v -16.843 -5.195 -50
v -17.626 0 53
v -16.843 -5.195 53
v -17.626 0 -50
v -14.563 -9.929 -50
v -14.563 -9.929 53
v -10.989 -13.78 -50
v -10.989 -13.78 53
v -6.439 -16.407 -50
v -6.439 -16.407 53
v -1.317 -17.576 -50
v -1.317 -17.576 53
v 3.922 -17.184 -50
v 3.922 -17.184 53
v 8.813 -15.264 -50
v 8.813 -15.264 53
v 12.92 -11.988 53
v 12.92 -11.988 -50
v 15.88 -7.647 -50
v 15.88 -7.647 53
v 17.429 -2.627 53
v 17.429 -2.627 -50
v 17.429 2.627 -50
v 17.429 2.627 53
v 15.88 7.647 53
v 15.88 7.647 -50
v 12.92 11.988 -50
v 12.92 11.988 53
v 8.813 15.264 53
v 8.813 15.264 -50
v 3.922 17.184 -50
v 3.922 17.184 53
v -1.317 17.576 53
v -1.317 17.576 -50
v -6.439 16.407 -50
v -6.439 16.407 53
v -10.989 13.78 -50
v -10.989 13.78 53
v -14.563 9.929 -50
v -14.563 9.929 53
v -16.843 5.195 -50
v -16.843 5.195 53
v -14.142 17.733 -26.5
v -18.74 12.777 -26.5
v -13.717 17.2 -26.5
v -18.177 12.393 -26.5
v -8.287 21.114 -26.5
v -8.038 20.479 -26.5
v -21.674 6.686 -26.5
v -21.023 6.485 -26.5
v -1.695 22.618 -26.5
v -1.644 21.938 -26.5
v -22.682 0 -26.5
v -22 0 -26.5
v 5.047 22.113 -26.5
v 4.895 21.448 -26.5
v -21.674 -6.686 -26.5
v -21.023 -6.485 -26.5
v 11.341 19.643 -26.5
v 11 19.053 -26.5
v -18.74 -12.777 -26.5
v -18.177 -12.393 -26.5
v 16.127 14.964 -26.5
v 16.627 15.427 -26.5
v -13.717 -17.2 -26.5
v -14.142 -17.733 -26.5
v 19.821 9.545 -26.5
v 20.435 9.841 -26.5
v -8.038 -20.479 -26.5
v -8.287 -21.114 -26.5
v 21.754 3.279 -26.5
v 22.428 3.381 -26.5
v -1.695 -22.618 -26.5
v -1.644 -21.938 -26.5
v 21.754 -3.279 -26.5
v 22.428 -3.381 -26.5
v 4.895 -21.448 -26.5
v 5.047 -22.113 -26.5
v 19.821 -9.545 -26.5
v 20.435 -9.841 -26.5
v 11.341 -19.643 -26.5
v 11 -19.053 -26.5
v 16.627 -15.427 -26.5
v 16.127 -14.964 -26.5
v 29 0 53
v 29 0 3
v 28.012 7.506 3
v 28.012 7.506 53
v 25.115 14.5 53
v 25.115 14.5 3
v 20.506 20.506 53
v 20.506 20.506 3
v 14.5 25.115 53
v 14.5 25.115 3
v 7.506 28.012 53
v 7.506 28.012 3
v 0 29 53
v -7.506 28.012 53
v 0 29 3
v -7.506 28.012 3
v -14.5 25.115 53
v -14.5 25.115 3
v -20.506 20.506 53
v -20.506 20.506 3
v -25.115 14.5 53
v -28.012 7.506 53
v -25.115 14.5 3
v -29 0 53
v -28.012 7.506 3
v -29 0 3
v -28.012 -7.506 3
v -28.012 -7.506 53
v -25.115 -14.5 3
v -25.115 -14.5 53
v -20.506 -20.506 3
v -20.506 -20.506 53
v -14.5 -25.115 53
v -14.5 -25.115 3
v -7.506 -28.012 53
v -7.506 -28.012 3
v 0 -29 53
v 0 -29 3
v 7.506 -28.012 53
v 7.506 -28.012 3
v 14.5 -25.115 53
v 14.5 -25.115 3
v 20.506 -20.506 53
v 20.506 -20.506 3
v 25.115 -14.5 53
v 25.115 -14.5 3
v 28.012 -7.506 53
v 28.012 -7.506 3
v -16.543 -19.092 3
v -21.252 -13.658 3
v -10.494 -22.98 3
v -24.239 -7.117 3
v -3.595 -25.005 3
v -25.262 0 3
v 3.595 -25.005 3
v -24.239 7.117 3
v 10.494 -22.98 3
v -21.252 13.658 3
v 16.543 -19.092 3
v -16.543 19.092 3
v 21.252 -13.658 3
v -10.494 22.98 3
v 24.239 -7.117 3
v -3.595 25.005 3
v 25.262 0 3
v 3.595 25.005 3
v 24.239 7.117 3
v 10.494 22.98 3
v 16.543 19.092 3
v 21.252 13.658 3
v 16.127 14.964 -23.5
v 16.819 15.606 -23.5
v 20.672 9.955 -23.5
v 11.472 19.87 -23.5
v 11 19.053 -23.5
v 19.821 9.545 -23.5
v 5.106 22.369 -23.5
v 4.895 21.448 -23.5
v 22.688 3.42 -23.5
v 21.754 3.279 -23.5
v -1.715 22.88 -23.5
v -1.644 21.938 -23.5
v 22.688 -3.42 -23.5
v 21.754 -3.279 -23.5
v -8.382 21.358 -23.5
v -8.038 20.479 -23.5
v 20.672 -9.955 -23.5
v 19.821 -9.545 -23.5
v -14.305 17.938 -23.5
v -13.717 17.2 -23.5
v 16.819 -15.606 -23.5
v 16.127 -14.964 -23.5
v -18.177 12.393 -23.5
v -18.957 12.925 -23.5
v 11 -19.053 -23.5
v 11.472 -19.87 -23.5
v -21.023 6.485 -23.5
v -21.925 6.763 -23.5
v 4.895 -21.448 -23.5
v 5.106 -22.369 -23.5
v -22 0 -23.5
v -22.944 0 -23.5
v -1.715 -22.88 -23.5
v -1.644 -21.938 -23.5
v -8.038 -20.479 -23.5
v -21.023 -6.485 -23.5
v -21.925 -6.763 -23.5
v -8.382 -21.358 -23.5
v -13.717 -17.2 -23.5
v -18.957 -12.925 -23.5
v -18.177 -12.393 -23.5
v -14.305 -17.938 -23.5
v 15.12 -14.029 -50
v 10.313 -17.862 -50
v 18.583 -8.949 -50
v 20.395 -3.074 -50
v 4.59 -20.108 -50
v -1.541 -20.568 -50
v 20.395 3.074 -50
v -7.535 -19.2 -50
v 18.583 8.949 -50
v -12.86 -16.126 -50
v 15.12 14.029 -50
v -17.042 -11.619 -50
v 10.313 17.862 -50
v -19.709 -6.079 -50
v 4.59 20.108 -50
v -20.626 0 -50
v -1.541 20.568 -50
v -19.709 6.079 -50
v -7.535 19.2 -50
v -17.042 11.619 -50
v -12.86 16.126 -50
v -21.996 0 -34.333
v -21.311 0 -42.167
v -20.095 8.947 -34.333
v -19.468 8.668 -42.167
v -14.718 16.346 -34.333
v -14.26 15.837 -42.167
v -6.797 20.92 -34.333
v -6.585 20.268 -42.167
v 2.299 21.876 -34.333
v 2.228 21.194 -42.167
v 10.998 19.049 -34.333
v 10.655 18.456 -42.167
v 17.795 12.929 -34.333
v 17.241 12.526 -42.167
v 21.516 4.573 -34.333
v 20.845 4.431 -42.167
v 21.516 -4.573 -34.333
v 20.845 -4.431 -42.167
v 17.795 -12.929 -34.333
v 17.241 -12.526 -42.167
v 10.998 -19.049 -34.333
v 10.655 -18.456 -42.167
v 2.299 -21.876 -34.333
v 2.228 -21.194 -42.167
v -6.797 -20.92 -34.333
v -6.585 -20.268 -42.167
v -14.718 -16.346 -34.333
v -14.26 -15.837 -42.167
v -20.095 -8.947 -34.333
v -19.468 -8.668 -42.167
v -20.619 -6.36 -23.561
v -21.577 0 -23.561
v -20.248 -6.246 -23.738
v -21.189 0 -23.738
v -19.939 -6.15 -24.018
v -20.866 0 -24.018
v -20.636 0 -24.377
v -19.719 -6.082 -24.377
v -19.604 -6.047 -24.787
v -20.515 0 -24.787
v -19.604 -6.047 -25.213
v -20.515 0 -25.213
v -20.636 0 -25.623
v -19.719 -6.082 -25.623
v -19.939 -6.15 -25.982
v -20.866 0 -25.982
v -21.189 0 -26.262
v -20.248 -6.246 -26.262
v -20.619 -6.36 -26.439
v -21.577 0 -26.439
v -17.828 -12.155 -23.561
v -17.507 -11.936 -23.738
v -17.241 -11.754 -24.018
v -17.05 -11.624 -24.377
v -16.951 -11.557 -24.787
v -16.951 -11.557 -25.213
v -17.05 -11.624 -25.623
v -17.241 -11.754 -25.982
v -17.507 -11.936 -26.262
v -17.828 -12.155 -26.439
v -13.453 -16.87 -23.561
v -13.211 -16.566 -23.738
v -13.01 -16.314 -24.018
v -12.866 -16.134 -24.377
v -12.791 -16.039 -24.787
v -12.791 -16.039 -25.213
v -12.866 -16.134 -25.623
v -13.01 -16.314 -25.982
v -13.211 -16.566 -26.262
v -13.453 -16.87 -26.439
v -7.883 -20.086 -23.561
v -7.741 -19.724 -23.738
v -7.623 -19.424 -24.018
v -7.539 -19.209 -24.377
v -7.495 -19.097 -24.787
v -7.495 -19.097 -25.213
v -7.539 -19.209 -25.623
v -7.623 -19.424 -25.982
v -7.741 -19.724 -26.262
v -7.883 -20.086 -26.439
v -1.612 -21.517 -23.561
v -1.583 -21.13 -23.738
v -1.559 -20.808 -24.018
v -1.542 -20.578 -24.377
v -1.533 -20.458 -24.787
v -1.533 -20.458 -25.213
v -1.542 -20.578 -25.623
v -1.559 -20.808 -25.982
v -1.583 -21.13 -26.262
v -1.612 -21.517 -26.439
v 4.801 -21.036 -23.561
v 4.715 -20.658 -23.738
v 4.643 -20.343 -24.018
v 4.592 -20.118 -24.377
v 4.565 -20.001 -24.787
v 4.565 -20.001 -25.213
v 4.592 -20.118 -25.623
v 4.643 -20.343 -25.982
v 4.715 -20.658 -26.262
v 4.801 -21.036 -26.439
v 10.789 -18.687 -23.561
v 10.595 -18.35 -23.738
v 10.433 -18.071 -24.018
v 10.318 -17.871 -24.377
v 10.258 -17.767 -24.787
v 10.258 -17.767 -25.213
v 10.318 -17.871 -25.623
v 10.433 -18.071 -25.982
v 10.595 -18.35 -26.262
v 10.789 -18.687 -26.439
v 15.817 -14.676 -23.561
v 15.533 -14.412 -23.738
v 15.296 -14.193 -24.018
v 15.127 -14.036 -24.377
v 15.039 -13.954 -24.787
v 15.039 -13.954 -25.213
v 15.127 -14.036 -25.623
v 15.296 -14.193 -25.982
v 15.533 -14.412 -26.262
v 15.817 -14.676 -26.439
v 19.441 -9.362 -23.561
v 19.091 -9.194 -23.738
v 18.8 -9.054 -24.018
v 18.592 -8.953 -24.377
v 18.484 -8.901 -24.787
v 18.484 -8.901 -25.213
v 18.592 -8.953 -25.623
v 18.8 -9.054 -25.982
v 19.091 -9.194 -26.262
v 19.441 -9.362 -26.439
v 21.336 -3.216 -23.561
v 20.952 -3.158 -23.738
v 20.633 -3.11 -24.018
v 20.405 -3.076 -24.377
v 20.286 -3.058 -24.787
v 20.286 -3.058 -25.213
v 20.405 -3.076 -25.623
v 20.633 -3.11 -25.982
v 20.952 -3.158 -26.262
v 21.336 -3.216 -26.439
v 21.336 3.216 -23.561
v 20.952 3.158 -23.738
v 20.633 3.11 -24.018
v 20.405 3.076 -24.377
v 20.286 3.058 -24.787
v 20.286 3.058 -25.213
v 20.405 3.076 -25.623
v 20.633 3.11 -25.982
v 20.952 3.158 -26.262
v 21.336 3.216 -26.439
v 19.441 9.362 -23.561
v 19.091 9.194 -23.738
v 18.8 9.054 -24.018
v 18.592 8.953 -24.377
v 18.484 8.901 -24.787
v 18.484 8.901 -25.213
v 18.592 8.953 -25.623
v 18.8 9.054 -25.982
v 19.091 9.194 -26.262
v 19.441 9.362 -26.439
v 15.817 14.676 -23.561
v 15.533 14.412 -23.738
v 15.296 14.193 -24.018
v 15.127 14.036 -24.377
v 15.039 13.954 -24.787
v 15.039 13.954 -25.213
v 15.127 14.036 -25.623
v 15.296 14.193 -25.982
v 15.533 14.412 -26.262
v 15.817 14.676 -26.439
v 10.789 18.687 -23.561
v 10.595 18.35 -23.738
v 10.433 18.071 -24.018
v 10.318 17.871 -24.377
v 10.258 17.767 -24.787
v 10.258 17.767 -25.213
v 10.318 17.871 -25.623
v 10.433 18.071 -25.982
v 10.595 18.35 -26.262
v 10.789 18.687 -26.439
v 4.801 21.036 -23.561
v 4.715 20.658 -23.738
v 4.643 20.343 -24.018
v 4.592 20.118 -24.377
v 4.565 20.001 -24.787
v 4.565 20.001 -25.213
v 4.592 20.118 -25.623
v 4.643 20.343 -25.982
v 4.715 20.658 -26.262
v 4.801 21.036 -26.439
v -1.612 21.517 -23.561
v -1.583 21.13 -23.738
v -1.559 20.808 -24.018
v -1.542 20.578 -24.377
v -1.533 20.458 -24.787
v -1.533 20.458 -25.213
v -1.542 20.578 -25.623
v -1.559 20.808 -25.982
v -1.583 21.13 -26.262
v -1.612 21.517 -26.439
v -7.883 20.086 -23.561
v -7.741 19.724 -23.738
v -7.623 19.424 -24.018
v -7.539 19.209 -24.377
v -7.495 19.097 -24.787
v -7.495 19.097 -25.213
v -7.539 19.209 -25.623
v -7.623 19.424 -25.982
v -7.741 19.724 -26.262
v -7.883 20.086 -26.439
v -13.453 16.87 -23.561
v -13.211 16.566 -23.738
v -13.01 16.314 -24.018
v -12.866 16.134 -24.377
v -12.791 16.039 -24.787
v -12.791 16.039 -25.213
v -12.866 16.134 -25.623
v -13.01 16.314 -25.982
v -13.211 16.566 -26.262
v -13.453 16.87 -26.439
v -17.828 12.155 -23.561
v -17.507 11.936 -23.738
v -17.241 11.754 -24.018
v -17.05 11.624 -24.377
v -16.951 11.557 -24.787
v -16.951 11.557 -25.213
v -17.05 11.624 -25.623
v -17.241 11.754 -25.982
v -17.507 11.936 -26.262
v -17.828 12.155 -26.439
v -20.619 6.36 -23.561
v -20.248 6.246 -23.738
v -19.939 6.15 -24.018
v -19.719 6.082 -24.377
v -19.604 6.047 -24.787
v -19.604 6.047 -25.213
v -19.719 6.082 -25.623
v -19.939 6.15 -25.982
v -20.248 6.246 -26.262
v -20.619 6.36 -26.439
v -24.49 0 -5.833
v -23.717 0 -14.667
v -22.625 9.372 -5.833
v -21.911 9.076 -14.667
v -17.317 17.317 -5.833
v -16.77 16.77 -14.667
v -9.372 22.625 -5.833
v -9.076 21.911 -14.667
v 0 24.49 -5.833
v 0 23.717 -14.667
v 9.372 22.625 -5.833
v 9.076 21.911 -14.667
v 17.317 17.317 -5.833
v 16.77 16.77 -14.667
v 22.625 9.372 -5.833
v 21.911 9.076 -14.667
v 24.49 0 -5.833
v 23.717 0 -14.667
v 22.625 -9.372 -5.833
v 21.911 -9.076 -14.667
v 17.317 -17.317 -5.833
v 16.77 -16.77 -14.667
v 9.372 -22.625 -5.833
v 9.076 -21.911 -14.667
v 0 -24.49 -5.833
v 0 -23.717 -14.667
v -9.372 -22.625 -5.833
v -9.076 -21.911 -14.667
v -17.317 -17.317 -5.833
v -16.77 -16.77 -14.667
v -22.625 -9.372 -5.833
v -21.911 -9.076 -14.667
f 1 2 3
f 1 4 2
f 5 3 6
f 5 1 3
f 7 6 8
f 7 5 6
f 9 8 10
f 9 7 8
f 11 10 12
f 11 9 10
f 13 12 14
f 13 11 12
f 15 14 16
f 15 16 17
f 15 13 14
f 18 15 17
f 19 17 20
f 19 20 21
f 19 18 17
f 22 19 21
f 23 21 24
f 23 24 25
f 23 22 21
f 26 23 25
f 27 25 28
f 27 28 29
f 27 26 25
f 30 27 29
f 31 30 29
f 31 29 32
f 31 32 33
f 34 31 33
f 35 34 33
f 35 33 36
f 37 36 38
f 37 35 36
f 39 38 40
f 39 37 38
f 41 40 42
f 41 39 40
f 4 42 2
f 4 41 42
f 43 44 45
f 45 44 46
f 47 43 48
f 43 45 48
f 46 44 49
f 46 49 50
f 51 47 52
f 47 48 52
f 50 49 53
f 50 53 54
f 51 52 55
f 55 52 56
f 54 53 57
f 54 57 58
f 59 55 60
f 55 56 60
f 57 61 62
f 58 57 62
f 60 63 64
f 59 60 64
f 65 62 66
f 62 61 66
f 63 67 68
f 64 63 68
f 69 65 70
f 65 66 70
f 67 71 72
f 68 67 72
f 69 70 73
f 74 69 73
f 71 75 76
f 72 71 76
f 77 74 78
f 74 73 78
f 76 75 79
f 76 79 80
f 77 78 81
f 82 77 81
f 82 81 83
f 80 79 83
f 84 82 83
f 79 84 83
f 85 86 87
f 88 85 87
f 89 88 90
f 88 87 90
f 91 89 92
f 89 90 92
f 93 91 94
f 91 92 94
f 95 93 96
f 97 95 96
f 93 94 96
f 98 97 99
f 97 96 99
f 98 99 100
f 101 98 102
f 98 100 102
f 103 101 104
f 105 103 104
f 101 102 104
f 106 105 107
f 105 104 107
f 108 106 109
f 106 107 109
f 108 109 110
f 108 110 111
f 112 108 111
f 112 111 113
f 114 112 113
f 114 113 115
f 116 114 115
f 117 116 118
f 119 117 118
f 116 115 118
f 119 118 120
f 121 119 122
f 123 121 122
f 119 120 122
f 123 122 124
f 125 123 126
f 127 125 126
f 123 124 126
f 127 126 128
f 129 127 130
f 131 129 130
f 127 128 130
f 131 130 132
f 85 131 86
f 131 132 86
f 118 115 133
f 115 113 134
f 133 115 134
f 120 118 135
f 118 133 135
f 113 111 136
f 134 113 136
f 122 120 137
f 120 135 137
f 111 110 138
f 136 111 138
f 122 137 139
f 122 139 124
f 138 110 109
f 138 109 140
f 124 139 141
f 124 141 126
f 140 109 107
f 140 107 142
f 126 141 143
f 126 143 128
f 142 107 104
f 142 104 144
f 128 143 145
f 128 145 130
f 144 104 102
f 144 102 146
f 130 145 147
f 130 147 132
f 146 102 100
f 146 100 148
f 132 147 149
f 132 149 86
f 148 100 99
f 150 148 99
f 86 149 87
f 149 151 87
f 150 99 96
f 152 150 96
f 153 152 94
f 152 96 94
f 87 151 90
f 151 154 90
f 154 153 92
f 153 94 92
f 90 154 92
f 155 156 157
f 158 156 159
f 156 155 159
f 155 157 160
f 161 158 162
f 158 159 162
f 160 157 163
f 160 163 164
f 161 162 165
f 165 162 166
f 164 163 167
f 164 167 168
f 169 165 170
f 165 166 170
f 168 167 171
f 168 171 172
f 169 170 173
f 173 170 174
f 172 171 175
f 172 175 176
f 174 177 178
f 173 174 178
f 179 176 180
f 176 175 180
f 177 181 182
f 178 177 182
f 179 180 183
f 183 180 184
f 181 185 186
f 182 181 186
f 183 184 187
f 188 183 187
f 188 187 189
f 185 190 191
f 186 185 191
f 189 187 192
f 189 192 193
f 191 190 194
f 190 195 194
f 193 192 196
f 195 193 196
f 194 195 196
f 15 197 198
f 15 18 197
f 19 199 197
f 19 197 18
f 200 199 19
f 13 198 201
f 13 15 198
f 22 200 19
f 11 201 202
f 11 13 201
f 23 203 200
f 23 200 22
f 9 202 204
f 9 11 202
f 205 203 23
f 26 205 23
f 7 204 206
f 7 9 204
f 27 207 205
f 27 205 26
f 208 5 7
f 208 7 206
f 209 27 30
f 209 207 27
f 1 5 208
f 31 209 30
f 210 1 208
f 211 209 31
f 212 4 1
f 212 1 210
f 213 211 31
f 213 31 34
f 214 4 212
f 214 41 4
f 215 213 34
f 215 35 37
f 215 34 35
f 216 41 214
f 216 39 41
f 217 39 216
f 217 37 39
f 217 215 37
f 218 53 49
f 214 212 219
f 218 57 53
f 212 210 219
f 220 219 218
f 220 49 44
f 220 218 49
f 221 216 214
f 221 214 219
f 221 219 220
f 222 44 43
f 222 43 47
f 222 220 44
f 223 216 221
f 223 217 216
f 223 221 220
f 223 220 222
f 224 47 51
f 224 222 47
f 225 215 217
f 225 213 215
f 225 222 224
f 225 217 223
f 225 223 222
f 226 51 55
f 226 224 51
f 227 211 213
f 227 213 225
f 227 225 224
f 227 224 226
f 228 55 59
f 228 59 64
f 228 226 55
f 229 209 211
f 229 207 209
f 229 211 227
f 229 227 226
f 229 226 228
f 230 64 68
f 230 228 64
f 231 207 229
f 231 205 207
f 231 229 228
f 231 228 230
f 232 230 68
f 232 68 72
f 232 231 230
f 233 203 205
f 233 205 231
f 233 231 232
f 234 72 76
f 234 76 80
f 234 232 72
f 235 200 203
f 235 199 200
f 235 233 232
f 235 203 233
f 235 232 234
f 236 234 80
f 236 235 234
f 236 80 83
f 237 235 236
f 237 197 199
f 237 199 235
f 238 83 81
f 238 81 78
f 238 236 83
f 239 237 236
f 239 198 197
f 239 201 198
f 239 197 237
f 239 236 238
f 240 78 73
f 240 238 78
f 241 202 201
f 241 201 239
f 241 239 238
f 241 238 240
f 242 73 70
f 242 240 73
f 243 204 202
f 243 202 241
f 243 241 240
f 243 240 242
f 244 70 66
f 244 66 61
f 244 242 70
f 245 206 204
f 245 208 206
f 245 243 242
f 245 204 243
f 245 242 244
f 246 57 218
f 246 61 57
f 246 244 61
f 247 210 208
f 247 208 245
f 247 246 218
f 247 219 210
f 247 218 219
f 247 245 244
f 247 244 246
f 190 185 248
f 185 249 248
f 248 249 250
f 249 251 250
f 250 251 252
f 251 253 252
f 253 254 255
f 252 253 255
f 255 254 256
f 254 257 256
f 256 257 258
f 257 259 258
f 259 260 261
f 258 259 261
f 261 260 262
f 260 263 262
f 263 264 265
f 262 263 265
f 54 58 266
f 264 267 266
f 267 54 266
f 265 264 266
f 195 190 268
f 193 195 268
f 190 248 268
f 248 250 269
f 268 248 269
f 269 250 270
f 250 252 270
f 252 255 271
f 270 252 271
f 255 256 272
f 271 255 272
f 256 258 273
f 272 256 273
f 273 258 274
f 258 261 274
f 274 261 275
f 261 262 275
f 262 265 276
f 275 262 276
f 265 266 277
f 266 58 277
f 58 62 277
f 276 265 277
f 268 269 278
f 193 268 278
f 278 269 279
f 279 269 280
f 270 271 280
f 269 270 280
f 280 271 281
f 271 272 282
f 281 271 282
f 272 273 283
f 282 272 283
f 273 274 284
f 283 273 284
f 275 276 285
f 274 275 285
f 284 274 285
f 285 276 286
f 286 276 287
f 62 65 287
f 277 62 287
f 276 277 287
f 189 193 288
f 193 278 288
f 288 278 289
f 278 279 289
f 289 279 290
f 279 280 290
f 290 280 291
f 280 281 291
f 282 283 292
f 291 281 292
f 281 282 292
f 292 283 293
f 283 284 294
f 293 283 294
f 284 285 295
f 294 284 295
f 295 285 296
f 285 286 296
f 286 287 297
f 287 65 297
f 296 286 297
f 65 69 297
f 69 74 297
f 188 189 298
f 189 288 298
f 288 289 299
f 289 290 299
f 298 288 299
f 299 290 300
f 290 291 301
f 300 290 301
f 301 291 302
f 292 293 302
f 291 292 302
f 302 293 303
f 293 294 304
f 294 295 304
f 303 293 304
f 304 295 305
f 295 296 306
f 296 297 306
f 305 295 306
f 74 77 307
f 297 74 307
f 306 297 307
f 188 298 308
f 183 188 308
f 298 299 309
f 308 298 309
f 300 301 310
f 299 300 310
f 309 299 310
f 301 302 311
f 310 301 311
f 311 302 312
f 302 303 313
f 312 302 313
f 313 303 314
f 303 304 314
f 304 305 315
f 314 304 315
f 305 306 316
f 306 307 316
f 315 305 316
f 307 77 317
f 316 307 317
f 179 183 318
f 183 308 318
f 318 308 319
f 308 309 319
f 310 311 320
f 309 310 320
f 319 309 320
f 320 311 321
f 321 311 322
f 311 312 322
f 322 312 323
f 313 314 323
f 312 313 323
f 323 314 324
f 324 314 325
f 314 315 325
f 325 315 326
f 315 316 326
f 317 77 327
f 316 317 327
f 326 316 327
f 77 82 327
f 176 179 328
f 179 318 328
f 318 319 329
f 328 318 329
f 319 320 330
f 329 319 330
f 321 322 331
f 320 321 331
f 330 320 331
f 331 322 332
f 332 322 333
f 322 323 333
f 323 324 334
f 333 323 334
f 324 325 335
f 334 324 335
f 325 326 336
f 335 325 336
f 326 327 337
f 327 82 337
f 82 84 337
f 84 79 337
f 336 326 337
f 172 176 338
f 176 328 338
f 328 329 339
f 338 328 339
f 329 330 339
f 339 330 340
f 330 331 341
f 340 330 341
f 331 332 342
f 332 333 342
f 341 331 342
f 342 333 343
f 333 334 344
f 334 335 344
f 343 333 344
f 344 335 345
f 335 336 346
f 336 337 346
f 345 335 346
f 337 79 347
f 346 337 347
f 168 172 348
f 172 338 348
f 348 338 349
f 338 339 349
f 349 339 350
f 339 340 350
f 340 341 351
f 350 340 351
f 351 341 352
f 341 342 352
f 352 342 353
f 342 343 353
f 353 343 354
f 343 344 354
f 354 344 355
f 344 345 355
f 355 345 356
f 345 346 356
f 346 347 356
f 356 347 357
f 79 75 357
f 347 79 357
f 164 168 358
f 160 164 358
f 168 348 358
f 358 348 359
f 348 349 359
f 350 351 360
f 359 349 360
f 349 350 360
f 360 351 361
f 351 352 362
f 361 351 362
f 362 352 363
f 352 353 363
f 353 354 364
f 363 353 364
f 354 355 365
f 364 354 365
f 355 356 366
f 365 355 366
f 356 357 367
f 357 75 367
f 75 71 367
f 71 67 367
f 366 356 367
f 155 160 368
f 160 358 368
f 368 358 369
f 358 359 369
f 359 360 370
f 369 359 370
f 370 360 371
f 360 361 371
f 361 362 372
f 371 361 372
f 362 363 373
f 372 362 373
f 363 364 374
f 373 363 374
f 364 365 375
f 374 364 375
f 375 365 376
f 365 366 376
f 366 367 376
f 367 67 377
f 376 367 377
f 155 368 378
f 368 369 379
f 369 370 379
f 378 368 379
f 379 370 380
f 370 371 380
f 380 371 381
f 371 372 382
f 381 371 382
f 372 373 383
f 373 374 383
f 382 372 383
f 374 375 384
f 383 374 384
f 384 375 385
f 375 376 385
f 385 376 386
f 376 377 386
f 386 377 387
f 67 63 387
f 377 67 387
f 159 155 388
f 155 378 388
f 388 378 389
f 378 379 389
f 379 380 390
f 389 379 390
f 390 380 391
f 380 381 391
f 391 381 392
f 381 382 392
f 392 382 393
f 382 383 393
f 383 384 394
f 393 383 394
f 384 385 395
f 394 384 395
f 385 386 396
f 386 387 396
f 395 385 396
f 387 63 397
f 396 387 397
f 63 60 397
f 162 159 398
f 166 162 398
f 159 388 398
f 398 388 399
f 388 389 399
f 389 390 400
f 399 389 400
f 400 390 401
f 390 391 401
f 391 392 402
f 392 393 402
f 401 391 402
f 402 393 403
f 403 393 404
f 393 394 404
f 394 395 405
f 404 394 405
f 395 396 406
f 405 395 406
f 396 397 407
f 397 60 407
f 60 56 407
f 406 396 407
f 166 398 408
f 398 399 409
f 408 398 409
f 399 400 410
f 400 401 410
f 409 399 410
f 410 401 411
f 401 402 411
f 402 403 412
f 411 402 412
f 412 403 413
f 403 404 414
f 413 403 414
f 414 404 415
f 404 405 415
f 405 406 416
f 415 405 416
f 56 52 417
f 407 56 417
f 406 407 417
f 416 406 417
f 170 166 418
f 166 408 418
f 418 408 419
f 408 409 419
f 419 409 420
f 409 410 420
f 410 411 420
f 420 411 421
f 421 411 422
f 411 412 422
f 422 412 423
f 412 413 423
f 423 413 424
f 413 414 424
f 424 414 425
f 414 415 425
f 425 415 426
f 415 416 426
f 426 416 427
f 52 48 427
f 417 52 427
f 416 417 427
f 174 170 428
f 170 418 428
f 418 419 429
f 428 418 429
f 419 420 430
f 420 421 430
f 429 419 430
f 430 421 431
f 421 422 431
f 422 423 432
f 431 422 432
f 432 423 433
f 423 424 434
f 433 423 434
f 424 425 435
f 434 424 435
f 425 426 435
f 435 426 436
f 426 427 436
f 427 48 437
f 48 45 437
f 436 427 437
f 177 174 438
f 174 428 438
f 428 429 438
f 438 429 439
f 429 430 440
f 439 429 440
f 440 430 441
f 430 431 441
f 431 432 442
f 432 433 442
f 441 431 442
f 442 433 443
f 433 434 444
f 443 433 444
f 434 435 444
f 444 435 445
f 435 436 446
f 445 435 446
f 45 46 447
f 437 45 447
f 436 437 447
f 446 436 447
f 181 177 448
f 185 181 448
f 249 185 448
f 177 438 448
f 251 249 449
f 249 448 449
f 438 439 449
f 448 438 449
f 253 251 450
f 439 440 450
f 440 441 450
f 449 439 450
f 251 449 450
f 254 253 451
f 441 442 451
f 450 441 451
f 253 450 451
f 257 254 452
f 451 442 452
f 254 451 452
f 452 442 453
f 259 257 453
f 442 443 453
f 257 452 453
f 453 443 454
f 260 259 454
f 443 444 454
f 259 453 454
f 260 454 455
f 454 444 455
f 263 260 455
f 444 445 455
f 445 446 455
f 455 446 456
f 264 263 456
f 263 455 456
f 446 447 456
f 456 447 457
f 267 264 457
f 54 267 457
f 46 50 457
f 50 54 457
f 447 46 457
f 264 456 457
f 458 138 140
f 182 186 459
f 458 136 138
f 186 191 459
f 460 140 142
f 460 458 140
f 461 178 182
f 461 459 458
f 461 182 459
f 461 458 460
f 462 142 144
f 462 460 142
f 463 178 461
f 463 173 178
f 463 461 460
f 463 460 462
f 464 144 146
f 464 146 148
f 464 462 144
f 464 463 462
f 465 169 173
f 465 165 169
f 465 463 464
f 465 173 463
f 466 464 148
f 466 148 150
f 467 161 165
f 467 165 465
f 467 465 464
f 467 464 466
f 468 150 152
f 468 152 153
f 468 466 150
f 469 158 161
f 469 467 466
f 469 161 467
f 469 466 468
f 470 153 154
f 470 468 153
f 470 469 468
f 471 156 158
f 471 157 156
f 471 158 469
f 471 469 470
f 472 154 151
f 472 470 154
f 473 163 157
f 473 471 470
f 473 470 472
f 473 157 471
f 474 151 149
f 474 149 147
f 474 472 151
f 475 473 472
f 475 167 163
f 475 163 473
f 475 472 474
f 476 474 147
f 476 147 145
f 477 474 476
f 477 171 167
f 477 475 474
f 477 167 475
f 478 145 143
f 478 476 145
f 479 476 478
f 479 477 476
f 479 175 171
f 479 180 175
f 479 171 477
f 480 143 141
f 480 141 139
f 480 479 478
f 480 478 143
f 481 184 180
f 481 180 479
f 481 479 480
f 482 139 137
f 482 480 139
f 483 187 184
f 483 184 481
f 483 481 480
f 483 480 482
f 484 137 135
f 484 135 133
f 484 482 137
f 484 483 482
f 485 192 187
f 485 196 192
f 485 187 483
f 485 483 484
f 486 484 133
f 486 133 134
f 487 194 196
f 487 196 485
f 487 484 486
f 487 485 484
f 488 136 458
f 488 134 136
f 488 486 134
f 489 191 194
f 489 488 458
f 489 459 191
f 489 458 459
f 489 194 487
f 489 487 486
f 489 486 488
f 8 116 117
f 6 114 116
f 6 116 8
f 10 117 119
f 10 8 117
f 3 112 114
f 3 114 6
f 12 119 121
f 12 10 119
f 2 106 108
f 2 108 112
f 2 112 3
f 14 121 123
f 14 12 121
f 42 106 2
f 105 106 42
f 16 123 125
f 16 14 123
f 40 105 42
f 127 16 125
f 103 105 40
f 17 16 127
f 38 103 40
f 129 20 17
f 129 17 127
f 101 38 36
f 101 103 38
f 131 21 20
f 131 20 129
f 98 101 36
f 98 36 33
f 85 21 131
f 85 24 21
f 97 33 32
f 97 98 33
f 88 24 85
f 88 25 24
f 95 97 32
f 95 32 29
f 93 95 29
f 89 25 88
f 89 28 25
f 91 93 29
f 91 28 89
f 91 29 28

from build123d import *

# Parameters (mm, degrees)
SKETCH1_R           = 20.625566824
BOSS_EXTRUDE1_DEPTH = 53
BOSS_EXTRUDE1_DRAFT = 5
SKETCH2_R           = 17.625566824
CUT_EXTRUDE1_DEPTH  = 64.917011631
SKETCH_4_R          = 29
SKETCH_4_R_2        = 17.625566824
EXTRUDE_1_DEPTH     = 50


with BuildPart() as part:
    # Sketch1 → Boss-Extrude1 (with draft: the straight prism first)
    with BuildSketch(Plane(origin=(0, 0, -50), x_dir=(-1, 0, 0), z_dir=(0, 0, -1))):
        Circle(SKETCH1_R)
    extrude(amount=-BOSS_EXTRUDE1_DEPTH)
    # Boss-Extrude1: the draft: its side faces are tilted about the plane it starts from
    boss_extrude1_sides = [part.faces().sort_by_distance(p)[0] for p in [
        (20.625566824, 0, -23.5),
    ]]
    draft(boss_extrude1_sides, Plane(origin=(0, 0, -50), x_dir=(-1, 0, 0), z_dir=(0, 0, -1)), BOSS_EXTRUDE1_DRAFT)

    # Sketch2 → Cut-Extrude1 (cut, through all)
    with BuildSketch(Plane(origin=(0, 0, -50), x_dir=(-1, 0, 0), z_dir=(0, 0, -1))):
        Circle(SKETCH2_R)
    extrude(amount=-CUT_EXTRUDE1_DEPTH, mode=Mode.SUBTRACT)

    # Эскиз1 → Вырез-Повернуть1 (revolve, cut)
    with BuildSketch(Plane(origin=(0, 0, 0), x_dir=(0, 0, -1), z_dir=(1, 0, 0)), mode=Mode.PRIVATE) as cut_revolve_1_sk:
        with BuildLine():
            Line((26.5, 22), (26.5, 23.5))
            Line((26.5, 23.5), (23.5, 23.5))
            Line((23.5, 23.5), (23.5, 22))
            ThreePointArc((23.5, 22), (25, 20.5), (26.5, 22))
        make_face()
    revolve(cut_revolve_1_sk.sketch.rotate(Axis((0, 0, -8.98762519), (0, 0, 1)), 90), axis=Axis((0, 0, -8.98762519), (0, 0, 1)), mode=Mode.SUBTRACT)

    # Эскиз4 → Бобышка-Вытянуть1 (add)
    with BuildSketch(Plane.XY.offset(3)):
        Circle(SKETCH_4_R)
        with Locations(Location((0, 0, 0), (0, 0, 180))):
            Circle(SKETCH_4_R_2, mode=Mode.SUBTRACT)
    extrude(amount=EXTRUDE_1_DEPTH)


solid = part.part
